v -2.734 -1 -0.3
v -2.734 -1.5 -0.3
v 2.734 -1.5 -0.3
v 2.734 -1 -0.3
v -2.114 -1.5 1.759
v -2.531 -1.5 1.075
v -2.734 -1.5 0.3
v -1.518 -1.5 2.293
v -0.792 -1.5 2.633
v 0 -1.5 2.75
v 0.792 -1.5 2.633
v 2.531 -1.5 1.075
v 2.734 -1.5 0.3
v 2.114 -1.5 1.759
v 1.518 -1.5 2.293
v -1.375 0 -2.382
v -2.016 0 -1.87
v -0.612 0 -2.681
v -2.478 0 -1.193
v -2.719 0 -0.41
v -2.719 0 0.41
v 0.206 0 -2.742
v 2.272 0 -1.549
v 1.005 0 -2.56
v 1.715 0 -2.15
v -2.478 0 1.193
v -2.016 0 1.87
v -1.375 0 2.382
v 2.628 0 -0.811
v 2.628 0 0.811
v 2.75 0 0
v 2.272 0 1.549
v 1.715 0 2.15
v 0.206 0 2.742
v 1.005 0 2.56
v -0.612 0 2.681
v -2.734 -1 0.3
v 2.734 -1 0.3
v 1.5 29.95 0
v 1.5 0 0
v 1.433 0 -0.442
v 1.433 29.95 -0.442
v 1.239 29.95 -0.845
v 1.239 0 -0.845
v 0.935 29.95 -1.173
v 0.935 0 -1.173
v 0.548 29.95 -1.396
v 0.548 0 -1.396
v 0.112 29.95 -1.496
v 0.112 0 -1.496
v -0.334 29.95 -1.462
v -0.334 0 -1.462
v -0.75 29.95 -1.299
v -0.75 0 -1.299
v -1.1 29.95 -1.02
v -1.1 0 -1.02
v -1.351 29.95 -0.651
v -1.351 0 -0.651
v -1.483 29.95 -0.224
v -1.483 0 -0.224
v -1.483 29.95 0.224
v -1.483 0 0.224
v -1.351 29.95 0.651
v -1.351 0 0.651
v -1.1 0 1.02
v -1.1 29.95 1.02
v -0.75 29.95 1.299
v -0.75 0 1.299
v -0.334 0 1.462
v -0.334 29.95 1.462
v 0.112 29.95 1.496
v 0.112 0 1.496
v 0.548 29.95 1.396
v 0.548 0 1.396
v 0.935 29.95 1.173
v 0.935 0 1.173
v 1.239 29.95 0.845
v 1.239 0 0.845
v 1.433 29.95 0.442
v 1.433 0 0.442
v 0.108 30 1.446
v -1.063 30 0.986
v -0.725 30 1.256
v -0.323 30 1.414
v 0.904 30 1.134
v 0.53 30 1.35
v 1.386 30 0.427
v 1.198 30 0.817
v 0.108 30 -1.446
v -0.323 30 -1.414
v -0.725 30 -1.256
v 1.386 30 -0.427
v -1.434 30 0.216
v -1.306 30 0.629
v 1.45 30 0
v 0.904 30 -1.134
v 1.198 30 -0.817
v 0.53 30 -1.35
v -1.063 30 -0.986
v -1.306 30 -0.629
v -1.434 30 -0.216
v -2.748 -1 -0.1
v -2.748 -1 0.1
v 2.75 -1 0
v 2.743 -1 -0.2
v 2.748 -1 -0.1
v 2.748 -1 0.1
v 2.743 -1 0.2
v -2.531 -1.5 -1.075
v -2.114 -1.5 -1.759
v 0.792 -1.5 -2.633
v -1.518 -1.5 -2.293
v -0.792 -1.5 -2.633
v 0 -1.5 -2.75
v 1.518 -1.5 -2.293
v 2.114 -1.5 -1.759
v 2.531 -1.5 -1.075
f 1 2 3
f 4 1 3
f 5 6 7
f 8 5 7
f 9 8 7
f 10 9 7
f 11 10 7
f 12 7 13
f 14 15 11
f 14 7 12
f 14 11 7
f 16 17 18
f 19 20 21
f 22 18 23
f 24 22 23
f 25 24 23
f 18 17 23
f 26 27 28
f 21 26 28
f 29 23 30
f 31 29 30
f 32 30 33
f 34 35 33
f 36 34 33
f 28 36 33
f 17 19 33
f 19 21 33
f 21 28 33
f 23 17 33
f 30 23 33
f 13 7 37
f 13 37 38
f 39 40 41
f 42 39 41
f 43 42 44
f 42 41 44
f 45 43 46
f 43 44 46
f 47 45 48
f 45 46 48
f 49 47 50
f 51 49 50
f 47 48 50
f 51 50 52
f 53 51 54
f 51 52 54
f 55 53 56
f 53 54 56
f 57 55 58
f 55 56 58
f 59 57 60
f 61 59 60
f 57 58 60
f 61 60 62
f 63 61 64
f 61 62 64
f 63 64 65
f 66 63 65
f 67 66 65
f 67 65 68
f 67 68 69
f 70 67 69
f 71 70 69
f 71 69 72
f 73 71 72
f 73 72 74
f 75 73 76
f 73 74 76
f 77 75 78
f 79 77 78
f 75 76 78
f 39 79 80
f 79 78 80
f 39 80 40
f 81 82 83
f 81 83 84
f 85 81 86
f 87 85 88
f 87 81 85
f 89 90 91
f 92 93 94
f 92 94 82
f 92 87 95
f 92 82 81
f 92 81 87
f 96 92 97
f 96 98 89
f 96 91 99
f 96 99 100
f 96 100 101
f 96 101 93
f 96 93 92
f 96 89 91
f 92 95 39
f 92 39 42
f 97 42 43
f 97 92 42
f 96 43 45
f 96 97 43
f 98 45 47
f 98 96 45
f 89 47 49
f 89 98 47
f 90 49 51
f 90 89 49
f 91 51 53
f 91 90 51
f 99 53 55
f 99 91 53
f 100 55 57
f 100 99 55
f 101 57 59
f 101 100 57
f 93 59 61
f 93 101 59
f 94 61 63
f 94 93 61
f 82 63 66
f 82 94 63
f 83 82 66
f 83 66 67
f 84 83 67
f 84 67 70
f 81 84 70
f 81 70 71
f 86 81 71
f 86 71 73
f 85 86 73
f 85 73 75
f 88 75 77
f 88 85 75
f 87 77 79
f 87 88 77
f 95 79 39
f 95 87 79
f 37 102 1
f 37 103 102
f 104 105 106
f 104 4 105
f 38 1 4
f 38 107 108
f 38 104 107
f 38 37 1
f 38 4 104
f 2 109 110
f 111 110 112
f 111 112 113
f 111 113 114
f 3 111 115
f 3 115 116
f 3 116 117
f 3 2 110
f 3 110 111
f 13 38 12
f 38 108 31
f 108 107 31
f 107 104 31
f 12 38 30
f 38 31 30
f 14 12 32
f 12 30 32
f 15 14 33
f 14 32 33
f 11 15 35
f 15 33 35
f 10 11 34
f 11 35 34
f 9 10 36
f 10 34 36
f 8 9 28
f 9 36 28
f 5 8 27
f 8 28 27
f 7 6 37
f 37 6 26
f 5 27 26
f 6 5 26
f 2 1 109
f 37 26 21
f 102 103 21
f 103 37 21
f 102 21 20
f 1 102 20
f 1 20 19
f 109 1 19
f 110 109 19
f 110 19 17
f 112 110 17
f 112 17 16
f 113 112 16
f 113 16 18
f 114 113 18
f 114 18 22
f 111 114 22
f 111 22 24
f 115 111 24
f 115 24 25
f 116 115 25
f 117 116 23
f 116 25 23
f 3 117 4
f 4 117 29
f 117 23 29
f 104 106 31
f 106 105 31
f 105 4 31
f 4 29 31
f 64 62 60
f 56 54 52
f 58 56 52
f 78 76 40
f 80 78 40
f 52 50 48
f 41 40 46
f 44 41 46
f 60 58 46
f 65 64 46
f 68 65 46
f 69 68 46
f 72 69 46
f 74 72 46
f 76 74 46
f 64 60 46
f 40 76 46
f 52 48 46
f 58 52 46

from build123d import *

# Parameters (mm, degrees)
SKETCH1_R           = 1.5
BOSS_EXTRUDE1_DEPTH = 30
SKETCH2_R           = 2.75
BOSS_EXTRUDE2_DEPTH = 1.5
SKETCH3_W           = 8.196351728
SKETCH3_H           = 0.6
CUT_EXTRUDE1_DEPTH  = 0.5
CHAMFER1_SIZE       = 0.05


with BuildPart() as part:
    # Sketch1 → Boss-Extrude1 (new body)
    with BuildSketch(Plane(origin=(0, 0, 0), x_dir=(1, 0, 0), z_dir=(0, 1, 0))):
        Circle(SKETCH1_R)
    extrude(amount=BOSS_EXTRUDE1_DEPTH)

    # Chamfer1
    chamfer1_edges = [part.edges().sort_by_distance(p)[0] for p in [
        (-1.5, 30, 0),
    ]]
    chamfer(chamfer1_edges, length=CHAMFER1_SIZE)


with BuildPart() as body_2:
    # Sketch2 → Boss-Extrude2 (new body)
    with BuildSketch(Plane.XZ):
        Circle(SKETCH2_R)
    extrude(amount=BOSS_EXTRUDE2_DEPTH)

    # Sketch3 → Cut-Extrude1 (cut)
    with BuildSketch(Plane.XZ.offset(1.5)):
        Rectangle(SKETCH3_W, SKETCH3_H)
    extrude(amount=-CUT_EXTRUDE1_DEPTH, mode=Mode.SUBTRACT)


solid = Compound([part.part, body_2.part])
